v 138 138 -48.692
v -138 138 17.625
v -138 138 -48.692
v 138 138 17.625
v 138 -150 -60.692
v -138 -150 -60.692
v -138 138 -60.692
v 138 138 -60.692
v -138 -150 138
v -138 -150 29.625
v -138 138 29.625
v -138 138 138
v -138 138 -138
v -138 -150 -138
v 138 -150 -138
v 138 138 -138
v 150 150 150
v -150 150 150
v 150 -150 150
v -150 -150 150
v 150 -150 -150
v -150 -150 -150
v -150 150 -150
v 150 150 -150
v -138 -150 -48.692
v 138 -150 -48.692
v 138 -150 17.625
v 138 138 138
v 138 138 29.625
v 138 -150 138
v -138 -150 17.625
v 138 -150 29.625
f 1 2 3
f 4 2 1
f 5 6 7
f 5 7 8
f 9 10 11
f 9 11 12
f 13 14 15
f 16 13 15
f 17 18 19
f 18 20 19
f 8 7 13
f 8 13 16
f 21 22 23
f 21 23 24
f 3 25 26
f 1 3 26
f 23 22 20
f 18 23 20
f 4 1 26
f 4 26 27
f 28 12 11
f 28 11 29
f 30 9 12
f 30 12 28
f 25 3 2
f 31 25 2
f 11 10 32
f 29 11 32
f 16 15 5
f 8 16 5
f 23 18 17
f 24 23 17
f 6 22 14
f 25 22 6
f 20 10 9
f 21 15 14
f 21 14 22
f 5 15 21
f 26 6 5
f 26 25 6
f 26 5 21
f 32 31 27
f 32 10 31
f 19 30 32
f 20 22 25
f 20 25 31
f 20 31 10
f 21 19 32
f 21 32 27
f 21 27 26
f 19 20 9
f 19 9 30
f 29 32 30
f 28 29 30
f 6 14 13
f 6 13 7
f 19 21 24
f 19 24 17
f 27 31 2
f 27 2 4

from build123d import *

# Parameters (mm, degrees)
F0_W     = 300
F0_H     = 300
F1_DEPTH = 150
F2_T     = -12
F3_W     = 276
F3_H     = 12
F4_DEPTH = 288
F5_W     = 276
F5_H     = 12
F6_DEPTH = 288


with BuildPart() as f1:
    # F0 (on Front) → F1 (new body, symmetric)
    with BuildSketch(Plane.XZ):
        Rectangle(F0_W, F0_H)
    extrude(amount=F1_DEPTH, both=True)

    # F2
    f2_openings = [f1.faces().sort_by_distance(p)[0] for p in [
        (0, -150, 0),
    ]]
    offset(amount=F2_T, openings=f2_openings)

    # F3 (on face) → F4 (join)
    with BuildSketch(Plane.XZ.offset(150)):
        with Locations((0, 23.6249938158)):
            Rectangle(F3_W, F3_H)
    extrude(amount=-F4_DEPTH)

    # F5 (on face) → F6 (join)
    with BuildSketch(Plane.XZ.offset(150)):
        with Locations((0, -54.6922665407)):
            Rectangle(F5_W, F5_H)
    extrude(amount=-F6_DEPTH)


solid = f1.part
